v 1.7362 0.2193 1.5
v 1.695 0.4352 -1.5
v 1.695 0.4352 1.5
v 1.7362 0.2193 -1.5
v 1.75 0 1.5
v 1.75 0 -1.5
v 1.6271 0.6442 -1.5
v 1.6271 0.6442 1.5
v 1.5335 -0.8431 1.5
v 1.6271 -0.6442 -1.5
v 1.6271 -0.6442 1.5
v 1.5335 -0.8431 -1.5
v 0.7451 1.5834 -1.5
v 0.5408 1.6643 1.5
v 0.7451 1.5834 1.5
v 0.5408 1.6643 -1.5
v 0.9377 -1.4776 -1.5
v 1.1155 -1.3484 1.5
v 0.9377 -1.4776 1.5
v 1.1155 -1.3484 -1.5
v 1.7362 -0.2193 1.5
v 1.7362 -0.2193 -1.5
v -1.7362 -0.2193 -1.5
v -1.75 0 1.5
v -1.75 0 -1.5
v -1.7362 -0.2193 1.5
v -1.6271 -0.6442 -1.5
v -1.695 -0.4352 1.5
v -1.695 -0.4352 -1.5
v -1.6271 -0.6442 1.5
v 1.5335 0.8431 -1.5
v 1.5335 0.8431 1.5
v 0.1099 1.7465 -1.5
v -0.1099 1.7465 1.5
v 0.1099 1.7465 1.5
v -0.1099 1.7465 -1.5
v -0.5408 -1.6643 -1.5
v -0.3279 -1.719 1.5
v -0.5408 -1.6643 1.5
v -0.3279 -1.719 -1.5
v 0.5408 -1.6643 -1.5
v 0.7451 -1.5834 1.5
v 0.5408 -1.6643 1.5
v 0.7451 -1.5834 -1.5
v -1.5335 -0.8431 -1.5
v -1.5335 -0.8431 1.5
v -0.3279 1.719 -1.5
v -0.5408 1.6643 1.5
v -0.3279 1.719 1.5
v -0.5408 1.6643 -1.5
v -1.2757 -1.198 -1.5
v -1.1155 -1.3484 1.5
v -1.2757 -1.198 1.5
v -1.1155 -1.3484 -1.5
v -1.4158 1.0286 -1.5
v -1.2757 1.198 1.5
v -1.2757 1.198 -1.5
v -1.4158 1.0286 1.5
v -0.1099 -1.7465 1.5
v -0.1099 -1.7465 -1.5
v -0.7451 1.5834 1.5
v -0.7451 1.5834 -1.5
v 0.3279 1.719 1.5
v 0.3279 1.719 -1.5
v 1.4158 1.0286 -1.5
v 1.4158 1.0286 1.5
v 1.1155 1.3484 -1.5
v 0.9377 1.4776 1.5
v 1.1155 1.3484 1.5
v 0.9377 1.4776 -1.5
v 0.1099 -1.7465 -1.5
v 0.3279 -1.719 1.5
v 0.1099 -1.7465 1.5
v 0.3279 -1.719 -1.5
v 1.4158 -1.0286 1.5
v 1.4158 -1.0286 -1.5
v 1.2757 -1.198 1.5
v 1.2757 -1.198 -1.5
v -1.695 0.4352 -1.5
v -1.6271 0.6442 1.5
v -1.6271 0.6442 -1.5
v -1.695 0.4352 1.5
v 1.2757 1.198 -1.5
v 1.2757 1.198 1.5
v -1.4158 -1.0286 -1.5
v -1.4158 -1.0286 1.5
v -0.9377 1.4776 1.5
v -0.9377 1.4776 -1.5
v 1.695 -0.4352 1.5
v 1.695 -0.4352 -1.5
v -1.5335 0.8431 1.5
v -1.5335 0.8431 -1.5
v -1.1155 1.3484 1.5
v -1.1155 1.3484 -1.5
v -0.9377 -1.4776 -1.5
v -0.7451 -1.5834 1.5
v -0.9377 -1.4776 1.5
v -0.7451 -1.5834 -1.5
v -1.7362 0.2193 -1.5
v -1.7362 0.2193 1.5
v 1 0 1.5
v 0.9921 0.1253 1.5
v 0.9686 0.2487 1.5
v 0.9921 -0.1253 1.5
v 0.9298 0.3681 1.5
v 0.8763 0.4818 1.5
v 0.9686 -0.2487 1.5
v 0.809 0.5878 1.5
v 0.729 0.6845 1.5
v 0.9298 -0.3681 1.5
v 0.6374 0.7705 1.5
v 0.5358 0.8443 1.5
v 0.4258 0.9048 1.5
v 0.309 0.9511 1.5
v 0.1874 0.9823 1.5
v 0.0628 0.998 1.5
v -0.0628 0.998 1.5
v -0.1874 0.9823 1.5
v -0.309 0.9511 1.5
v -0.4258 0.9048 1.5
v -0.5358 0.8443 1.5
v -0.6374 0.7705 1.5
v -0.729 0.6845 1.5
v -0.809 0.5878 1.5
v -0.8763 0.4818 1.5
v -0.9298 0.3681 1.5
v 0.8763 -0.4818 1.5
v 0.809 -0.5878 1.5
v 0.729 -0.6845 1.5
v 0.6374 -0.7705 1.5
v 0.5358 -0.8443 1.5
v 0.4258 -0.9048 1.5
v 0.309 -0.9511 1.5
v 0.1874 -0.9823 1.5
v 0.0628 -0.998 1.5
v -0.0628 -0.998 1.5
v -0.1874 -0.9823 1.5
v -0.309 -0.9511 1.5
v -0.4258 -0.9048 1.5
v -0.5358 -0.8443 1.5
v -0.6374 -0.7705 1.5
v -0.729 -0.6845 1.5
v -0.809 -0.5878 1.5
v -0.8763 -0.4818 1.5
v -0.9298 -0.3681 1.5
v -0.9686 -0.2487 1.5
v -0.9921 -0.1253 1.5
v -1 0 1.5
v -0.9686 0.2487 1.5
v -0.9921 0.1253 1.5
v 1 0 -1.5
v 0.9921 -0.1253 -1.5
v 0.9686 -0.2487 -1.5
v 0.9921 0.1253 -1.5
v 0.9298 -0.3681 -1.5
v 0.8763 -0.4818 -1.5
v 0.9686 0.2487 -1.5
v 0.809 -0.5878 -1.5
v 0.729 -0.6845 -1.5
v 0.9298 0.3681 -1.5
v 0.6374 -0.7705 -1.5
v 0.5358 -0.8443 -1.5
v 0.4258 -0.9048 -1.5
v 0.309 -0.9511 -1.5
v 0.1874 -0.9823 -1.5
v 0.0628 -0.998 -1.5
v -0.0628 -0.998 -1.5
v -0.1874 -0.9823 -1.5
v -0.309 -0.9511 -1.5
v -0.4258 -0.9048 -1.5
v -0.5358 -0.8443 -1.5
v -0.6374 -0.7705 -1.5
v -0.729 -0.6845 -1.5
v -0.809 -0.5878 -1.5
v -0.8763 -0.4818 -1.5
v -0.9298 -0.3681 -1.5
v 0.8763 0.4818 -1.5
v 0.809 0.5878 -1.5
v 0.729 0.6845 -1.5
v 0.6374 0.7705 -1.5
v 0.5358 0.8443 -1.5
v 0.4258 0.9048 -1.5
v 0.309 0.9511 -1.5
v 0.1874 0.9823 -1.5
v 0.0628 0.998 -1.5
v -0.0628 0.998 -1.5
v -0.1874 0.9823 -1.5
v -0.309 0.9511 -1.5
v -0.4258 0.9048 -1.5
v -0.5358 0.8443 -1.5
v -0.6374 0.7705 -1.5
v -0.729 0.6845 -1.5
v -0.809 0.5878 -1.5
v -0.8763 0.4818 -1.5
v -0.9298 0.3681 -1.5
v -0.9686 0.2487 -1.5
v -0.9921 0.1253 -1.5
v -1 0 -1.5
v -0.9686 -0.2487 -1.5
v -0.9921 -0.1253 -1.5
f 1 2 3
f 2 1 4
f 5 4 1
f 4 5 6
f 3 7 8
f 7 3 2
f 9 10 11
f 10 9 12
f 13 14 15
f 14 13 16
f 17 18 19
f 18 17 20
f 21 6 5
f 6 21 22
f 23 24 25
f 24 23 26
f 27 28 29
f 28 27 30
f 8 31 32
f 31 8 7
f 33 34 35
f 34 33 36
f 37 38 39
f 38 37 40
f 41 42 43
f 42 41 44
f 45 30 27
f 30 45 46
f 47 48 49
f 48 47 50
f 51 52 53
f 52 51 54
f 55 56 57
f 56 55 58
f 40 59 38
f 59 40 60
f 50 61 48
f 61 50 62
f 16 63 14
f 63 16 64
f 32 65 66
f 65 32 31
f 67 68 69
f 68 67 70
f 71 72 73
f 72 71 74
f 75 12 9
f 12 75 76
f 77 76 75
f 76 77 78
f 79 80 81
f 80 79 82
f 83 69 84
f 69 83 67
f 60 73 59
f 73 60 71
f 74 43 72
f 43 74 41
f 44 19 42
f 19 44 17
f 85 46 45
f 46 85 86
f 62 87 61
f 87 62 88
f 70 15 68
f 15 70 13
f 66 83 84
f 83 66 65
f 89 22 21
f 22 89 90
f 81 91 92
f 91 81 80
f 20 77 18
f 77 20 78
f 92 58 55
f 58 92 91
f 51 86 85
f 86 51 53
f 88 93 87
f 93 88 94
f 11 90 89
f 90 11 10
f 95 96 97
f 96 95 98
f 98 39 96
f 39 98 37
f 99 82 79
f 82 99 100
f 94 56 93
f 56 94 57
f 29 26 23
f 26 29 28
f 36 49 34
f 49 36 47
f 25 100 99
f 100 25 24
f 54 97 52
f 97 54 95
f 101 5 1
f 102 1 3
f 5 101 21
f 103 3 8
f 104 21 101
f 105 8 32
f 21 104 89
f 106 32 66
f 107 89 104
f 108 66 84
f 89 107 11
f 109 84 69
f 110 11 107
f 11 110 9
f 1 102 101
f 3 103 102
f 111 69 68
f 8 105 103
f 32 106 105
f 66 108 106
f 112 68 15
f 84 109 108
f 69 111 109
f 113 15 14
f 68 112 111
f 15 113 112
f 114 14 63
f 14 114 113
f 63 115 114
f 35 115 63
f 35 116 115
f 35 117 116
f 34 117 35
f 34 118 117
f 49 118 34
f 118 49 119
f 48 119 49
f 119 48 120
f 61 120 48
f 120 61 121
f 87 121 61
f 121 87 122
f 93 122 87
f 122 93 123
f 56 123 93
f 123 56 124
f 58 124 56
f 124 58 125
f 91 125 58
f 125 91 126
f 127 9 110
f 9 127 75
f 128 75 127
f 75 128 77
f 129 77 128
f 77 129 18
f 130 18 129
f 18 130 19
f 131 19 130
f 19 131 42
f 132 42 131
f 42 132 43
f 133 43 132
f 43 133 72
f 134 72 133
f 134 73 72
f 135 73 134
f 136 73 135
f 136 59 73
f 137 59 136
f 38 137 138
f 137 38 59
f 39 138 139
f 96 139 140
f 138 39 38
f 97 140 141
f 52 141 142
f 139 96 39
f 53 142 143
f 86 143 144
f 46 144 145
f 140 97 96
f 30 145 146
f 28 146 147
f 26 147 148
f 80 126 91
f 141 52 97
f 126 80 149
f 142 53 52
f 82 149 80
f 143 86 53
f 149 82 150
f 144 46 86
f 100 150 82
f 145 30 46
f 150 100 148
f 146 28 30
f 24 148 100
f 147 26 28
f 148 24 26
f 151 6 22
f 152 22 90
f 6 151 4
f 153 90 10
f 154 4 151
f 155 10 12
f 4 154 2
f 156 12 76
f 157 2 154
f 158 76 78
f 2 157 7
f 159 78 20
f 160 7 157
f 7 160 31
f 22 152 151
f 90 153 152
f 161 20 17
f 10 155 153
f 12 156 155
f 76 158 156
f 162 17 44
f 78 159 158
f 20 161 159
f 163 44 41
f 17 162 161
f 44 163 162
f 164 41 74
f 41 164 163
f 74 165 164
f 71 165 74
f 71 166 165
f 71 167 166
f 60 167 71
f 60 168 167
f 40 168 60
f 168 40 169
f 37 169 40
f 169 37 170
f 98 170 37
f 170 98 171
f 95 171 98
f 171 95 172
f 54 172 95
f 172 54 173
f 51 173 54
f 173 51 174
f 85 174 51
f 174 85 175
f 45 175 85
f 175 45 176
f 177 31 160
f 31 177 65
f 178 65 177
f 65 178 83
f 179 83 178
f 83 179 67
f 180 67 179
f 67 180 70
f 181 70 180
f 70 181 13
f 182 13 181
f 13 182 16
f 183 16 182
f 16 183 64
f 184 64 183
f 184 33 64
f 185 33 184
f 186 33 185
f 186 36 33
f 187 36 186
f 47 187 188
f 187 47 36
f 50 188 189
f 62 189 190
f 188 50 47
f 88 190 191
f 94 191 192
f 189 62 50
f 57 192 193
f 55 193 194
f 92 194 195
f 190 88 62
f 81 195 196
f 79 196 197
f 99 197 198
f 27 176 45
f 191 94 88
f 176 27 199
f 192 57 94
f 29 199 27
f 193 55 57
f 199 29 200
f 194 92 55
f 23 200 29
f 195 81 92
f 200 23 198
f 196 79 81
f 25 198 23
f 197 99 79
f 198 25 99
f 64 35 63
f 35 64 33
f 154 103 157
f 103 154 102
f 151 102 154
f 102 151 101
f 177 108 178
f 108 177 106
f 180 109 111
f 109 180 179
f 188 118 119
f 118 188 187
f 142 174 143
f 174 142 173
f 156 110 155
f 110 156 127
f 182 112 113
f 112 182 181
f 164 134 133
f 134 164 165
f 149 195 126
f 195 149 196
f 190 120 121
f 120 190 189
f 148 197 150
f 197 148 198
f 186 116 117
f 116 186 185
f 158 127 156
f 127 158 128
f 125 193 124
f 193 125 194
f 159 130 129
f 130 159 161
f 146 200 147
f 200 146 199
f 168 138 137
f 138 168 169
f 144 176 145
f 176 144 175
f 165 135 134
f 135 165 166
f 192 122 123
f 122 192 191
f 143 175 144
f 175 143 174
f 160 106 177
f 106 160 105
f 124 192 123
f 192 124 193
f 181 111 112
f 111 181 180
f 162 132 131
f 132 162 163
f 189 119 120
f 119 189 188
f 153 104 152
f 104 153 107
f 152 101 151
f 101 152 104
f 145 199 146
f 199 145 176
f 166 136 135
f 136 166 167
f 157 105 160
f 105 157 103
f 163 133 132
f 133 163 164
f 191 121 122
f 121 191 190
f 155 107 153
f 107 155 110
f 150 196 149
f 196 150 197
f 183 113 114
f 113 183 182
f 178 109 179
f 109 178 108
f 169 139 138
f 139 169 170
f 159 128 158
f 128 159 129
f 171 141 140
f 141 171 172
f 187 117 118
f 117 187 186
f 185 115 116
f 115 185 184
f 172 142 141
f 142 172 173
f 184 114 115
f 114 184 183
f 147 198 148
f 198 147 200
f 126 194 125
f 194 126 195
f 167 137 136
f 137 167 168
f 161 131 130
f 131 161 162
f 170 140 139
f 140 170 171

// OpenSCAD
$fn = 50;


difference() {
	union() {
		translate(v = [0, 0, -1.5000000000]) {
			cylinder(h = 3, r = 1.7500000000);
		}
	}
	union() {
		translate(v = [0, 0, -100.0000000000]) {
			cylinder(h = 200, r = 1.0000000000);
		}
	}
}
